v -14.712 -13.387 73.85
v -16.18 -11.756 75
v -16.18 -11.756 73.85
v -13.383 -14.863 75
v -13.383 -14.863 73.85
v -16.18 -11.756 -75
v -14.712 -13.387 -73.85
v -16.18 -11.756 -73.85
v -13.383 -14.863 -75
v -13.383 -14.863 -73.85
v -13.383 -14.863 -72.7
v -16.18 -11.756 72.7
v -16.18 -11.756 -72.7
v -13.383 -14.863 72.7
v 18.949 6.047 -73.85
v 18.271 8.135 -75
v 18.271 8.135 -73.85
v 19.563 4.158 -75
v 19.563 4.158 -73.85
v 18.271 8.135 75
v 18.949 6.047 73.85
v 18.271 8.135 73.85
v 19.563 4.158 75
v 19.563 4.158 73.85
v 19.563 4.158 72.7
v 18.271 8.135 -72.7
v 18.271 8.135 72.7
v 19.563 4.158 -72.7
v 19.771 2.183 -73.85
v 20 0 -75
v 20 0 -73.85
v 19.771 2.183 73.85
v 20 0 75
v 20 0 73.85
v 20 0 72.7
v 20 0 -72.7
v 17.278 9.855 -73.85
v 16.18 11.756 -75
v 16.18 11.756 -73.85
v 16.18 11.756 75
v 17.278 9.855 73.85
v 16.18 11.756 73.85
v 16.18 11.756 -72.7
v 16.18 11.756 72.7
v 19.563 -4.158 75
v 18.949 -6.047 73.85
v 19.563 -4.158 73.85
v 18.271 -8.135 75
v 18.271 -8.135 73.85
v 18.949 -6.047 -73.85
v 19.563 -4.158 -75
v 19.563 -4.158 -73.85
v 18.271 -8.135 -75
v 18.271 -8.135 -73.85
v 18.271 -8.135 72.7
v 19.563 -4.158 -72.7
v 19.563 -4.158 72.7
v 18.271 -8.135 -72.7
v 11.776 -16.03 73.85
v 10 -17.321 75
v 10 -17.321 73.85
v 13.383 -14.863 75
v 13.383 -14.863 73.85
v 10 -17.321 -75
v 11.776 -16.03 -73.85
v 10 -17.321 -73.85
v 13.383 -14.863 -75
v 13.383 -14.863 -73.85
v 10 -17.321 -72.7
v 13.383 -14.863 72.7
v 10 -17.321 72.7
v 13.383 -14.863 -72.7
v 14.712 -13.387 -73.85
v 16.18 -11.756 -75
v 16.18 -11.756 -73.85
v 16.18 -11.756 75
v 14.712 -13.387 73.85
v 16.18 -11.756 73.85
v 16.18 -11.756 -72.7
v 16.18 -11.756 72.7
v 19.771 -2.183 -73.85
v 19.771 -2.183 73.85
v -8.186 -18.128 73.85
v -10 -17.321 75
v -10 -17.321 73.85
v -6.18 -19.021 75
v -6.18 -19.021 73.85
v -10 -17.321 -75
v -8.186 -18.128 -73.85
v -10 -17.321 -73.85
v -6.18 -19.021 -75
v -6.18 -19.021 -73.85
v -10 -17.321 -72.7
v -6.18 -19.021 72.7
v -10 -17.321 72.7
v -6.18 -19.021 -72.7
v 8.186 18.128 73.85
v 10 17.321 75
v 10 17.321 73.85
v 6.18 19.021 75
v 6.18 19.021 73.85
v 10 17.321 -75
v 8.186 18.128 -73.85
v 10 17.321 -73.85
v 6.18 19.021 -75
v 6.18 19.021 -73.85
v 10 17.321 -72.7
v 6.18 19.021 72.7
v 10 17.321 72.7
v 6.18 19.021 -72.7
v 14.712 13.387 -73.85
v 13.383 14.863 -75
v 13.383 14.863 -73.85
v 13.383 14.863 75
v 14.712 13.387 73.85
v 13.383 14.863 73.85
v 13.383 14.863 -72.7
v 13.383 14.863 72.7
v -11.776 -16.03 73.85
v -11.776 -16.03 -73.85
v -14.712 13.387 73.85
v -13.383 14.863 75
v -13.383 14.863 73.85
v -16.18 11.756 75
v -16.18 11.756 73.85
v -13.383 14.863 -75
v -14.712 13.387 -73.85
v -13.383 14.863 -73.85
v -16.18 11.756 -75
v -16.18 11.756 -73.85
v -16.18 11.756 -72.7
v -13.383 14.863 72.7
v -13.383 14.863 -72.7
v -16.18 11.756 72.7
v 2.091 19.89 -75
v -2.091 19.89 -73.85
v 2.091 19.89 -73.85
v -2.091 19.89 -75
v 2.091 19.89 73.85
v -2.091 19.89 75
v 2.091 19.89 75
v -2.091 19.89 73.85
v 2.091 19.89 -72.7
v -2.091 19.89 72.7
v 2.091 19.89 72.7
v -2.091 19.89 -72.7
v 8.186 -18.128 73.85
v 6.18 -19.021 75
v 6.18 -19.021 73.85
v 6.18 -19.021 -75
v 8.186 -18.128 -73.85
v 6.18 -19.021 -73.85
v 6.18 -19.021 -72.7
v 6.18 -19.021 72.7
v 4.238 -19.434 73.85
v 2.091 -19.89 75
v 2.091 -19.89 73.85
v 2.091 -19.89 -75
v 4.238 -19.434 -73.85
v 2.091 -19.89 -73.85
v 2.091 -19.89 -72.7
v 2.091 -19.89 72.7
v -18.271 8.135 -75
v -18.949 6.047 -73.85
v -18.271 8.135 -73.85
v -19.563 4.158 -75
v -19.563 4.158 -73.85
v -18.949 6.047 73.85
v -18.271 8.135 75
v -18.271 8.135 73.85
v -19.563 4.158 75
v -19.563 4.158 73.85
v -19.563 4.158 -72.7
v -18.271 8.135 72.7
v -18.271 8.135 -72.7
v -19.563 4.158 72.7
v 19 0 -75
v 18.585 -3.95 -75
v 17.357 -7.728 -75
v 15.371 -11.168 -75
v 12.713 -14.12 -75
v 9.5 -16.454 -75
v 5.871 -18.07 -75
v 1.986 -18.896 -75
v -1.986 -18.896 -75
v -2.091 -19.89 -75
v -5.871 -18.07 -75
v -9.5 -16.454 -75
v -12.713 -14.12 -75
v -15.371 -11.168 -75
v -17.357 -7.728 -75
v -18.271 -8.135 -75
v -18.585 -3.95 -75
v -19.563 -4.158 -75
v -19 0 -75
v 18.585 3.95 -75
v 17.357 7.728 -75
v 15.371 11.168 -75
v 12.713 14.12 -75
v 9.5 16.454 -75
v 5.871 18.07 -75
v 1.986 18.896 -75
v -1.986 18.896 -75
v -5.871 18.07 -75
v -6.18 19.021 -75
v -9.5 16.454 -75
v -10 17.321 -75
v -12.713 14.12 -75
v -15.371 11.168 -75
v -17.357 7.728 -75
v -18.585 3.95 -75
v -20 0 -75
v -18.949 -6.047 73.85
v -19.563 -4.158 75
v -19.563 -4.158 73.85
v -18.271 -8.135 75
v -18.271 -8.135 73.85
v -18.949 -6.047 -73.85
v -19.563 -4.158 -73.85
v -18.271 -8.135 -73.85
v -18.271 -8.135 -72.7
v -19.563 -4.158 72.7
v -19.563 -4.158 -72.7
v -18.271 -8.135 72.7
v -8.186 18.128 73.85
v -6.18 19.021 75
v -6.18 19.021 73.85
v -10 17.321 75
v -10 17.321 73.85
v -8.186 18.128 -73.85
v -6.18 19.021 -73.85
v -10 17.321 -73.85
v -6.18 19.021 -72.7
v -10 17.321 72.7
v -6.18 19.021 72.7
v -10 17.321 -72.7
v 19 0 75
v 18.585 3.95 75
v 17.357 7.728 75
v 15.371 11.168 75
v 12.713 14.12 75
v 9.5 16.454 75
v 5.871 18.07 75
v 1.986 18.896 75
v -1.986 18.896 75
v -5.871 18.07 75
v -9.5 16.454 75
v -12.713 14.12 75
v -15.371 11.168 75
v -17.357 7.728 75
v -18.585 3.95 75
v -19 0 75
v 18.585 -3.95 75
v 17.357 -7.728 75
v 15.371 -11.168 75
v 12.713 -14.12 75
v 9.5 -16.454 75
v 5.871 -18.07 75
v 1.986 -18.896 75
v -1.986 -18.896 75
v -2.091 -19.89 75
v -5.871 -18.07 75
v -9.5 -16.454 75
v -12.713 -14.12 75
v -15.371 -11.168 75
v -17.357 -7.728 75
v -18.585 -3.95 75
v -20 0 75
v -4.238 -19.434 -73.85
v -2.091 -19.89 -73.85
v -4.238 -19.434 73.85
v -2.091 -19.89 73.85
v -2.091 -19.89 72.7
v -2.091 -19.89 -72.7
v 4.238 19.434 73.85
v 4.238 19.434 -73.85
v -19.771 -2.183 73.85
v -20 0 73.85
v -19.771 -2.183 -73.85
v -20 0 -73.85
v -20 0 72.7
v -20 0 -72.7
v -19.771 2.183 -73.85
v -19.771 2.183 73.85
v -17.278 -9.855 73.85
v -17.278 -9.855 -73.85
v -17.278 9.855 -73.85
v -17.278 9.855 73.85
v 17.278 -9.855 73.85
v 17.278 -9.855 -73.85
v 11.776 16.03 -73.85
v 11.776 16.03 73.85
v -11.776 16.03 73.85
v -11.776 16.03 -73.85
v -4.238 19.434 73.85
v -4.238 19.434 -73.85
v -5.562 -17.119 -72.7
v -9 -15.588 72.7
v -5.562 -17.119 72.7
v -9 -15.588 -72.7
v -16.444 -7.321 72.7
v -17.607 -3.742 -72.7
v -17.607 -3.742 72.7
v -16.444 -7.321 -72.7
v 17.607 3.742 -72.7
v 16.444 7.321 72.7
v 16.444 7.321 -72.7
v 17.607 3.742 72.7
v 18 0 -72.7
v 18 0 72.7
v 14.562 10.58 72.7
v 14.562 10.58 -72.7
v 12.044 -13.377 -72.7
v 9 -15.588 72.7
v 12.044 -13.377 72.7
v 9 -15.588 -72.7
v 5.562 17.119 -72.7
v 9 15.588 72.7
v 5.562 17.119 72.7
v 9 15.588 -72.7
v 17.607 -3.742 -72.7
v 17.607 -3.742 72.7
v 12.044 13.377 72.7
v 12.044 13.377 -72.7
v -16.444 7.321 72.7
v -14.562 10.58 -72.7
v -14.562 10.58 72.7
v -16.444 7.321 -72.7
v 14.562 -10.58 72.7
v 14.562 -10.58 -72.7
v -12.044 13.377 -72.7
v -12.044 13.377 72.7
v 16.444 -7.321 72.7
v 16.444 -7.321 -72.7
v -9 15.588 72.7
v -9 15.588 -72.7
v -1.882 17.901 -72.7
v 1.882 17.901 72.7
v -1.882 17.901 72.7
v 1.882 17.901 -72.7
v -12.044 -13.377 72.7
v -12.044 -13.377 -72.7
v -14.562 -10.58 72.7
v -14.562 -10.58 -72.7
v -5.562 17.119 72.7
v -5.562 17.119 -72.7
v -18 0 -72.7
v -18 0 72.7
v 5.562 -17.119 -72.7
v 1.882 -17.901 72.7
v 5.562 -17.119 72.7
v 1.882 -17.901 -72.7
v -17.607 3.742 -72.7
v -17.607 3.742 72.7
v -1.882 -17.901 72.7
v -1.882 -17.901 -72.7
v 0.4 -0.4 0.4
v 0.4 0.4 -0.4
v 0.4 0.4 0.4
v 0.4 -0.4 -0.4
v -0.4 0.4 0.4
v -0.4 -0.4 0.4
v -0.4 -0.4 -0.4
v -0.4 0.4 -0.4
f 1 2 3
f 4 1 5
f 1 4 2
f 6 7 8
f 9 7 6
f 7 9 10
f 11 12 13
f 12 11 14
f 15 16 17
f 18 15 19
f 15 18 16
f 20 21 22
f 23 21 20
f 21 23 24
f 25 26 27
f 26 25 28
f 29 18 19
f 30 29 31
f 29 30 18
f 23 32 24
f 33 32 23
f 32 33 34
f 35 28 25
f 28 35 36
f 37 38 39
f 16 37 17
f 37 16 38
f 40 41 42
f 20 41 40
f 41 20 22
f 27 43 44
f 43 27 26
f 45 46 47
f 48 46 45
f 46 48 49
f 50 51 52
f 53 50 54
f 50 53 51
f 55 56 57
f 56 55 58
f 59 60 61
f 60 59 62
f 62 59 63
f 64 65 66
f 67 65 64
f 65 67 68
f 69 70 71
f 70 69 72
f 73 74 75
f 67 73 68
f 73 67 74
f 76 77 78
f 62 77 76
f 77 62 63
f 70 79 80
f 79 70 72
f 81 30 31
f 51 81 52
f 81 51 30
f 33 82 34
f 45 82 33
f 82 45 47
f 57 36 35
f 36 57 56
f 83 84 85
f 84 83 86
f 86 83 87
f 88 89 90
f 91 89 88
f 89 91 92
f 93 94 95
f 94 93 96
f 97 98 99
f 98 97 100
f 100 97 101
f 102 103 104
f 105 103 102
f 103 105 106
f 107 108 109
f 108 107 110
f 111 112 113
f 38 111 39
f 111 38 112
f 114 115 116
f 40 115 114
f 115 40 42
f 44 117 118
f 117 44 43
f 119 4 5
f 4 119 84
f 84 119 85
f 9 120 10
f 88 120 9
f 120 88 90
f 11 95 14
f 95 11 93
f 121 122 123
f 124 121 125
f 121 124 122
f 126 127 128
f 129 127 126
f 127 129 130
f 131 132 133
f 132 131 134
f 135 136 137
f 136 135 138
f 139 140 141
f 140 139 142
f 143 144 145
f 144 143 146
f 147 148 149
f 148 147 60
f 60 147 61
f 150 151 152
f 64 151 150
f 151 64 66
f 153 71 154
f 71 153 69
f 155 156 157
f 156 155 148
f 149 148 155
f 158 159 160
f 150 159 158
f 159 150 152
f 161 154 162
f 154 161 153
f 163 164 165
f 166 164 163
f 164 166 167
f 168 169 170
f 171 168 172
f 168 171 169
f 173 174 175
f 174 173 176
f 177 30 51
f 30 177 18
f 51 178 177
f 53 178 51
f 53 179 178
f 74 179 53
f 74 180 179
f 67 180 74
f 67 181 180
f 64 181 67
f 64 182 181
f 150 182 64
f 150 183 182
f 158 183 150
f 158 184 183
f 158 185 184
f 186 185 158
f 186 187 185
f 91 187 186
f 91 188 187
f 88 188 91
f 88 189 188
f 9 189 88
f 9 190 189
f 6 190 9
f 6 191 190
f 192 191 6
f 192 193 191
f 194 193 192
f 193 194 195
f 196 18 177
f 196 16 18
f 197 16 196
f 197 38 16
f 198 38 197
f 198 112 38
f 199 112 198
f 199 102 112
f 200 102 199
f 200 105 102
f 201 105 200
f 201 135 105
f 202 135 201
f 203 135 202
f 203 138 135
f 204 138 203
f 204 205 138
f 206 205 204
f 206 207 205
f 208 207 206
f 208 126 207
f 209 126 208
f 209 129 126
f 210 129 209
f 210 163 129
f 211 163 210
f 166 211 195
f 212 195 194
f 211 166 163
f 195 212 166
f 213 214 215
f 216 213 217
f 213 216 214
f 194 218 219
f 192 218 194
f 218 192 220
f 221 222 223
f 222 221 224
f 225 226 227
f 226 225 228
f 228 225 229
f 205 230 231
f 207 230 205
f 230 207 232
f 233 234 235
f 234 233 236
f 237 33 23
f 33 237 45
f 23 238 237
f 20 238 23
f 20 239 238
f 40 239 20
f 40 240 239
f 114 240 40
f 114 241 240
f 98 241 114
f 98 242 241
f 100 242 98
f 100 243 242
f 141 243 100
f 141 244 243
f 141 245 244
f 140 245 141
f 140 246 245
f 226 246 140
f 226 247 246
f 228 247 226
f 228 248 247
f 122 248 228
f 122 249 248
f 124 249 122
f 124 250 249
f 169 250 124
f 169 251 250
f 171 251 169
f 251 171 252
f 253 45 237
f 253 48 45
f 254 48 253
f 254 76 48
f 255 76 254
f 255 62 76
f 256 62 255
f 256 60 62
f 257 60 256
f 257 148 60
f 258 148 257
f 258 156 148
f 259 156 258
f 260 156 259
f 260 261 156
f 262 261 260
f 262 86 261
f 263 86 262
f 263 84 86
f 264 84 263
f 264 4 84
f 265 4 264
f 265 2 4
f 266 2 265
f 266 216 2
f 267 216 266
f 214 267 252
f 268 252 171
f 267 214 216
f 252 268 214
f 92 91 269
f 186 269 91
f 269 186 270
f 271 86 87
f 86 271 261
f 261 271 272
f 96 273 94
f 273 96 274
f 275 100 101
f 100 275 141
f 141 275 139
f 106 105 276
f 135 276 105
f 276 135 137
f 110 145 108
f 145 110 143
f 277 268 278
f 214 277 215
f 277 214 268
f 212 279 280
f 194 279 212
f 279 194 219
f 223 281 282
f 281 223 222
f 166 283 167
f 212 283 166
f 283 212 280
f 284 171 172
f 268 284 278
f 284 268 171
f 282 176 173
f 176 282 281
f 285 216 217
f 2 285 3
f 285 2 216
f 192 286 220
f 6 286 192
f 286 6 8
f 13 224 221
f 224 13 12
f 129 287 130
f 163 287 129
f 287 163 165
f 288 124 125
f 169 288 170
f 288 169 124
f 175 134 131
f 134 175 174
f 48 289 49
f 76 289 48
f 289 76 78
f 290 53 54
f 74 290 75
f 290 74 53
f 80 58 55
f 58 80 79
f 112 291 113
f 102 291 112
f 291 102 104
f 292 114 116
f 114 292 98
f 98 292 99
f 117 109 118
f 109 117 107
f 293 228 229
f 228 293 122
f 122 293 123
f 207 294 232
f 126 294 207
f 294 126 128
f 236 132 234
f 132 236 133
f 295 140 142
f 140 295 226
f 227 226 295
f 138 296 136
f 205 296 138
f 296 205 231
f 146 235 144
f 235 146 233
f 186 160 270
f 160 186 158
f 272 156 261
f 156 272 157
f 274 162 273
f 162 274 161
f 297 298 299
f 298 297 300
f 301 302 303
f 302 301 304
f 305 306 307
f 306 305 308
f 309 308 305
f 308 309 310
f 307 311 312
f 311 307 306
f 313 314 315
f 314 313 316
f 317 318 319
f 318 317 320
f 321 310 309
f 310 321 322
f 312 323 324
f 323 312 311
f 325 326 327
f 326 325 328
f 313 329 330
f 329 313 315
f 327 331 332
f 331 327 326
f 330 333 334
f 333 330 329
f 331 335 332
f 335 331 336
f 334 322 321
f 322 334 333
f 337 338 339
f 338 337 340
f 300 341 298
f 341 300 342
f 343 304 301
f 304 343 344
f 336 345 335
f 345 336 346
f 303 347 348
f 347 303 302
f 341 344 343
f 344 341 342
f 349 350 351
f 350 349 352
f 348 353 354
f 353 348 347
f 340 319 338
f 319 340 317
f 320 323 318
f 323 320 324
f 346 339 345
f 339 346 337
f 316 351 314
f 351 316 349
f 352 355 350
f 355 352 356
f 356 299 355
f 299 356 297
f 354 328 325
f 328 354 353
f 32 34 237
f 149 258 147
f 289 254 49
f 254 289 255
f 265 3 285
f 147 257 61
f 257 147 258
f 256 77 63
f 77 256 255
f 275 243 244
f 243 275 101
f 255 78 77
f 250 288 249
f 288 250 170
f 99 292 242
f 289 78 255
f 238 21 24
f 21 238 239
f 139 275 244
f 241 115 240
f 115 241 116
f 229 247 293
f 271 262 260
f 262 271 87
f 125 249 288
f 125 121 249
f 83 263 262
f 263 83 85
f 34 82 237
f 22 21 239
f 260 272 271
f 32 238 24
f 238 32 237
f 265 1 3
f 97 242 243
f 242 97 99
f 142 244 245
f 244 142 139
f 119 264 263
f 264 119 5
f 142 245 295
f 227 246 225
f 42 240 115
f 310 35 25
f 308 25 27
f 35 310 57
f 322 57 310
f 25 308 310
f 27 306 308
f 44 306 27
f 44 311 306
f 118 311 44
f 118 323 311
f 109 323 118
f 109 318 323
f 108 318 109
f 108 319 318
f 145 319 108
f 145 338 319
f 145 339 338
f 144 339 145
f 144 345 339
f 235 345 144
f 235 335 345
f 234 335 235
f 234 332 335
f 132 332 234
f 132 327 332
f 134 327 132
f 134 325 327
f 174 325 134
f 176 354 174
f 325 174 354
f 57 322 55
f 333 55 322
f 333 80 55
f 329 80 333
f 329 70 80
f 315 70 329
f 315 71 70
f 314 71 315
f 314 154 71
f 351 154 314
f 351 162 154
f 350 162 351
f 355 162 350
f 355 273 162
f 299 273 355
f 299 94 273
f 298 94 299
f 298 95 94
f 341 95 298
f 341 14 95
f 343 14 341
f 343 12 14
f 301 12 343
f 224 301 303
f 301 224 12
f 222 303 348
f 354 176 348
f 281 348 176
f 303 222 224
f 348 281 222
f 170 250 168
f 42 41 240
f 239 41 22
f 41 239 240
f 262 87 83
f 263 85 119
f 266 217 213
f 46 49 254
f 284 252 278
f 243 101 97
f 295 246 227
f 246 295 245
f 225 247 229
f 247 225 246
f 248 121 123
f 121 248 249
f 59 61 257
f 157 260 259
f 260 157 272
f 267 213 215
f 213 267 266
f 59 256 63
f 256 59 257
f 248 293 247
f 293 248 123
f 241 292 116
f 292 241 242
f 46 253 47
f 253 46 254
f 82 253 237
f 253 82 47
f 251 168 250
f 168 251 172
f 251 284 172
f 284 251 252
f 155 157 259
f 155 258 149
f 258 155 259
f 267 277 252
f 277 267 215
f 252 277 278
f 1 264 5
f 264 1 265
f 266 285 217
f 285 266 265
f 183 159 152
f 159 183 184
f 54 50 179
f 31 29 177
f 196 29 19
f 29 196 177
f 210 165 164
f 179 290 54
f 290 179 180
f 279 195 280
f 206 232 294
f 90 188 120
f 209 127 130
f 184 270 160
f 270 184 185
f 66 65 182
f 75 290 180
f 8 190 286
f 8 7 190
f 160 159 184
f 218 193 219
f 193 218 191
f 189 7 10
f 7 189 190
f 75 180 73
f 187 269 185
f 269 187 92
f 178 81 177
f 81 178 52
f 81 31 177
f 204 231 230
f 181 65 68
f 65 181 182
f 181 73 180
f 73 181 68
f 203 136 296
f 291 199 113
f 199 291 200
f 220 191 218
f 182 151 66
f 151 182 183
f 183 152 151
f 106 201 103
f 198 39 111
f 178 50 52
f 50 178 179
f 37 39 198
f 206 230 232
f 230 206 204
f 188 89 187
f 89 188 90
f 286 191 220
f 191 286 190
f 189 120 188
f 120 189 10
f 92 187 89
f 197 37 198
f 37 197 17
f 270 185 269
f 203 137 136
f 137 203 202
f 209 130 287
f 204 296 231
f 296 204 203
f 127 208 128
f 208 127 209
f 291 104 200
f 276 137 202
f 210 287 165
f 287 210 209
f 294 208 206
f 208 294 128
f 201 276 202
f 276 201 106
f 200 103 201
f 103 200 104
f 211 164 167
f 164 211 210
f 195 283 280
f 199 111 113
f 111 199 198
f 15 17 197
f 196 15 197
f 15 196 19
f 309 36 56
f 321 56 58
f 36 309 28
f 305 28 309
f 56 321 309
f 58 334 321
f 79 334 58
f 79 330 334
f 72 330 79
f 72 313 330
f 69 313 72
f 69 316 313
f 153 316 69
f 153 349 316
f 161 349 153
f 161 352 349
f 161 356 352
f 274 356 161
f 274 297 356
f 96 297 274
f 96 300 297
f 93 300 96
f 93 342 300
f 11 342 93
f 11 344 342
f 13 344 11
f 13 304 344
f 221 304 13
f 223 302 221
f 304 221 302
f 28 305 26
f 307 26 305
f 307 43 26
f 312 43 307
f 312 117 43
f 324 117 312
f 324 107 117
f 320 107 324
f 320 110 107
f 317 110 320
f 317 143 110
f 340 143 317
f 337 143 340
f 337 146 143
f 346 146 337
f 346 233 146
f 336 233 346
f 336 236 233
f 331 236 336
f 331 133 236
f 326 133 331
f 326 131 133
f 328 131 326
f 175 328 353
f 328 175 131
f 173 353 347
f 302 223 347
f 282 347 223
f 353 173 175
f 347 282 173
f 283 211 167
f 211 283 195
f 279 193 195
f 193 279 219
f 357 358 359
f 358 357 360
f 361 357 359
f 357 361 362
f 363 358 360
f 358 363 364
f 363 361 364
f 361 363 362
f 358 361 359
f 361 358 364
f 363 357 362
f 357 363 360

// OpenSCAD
// Parameters
pipe_length = 150; //[75:300:1]
outer_diameter = 40; //[20:80:1]
wall_thickness = 2; //[1:4:0.5]
chamfer_length = 1.5; //[0.5:4:0.5]
chamfer_radial = 1; //[0.5:3:0.5]
overlap = 0.8; //[0.5:2:0.1]

// Base Shapes
module pipe_body() {
  cylinder(h=pipe_length, r=outer_diameter/2, center=true);
}

module inner_bore() {
  cylinder(h=pipe_length + 2*overlap, r=outer_diameter/2 - wall_thickness, center=true);
}

module end_chamfer_top() {
  translate([0, 0, pipe_length/2 - (chamfer_length + overlap)/2])
    cylinder(h=chamfer_length + overlap, r1=outer_diameter/2 + chamfer_radial, r2=outer_diameter/2 - chamfer_radial, center=true);
}

module end_chamfer_bottom() {
  translate([0, 0, -pipe_length/2 + (chamfer_length + overlap)/2])
    cylinder(h=chamfer_length + overlap, r1=outer_diameter/2 - chamfer_radial, r2=outer_diameter/2 + chamfer_radial, center=true);
}

module markings_text() {
  cube([overlap, overlap, overlap], center=true);
}

// Operations
module end_chamfers() {
  union() {
    end_chamfer_top();
    end_chamfer_bottom();
  }
}

module pipe_with_bore() {
  difference() {
    pipe_body();
    inner_bore();
  }
}

module pipe_with_bore_and_chamfers() {
  difference() {
    pipe_with_bore();
    end_chamfers();
  }
}

// Final Output
module complete_model() {
  union() {
    pipe_with_bore_and_chamfers();
    markings_text();
  }
}

// Render the complete model
complete_model();
